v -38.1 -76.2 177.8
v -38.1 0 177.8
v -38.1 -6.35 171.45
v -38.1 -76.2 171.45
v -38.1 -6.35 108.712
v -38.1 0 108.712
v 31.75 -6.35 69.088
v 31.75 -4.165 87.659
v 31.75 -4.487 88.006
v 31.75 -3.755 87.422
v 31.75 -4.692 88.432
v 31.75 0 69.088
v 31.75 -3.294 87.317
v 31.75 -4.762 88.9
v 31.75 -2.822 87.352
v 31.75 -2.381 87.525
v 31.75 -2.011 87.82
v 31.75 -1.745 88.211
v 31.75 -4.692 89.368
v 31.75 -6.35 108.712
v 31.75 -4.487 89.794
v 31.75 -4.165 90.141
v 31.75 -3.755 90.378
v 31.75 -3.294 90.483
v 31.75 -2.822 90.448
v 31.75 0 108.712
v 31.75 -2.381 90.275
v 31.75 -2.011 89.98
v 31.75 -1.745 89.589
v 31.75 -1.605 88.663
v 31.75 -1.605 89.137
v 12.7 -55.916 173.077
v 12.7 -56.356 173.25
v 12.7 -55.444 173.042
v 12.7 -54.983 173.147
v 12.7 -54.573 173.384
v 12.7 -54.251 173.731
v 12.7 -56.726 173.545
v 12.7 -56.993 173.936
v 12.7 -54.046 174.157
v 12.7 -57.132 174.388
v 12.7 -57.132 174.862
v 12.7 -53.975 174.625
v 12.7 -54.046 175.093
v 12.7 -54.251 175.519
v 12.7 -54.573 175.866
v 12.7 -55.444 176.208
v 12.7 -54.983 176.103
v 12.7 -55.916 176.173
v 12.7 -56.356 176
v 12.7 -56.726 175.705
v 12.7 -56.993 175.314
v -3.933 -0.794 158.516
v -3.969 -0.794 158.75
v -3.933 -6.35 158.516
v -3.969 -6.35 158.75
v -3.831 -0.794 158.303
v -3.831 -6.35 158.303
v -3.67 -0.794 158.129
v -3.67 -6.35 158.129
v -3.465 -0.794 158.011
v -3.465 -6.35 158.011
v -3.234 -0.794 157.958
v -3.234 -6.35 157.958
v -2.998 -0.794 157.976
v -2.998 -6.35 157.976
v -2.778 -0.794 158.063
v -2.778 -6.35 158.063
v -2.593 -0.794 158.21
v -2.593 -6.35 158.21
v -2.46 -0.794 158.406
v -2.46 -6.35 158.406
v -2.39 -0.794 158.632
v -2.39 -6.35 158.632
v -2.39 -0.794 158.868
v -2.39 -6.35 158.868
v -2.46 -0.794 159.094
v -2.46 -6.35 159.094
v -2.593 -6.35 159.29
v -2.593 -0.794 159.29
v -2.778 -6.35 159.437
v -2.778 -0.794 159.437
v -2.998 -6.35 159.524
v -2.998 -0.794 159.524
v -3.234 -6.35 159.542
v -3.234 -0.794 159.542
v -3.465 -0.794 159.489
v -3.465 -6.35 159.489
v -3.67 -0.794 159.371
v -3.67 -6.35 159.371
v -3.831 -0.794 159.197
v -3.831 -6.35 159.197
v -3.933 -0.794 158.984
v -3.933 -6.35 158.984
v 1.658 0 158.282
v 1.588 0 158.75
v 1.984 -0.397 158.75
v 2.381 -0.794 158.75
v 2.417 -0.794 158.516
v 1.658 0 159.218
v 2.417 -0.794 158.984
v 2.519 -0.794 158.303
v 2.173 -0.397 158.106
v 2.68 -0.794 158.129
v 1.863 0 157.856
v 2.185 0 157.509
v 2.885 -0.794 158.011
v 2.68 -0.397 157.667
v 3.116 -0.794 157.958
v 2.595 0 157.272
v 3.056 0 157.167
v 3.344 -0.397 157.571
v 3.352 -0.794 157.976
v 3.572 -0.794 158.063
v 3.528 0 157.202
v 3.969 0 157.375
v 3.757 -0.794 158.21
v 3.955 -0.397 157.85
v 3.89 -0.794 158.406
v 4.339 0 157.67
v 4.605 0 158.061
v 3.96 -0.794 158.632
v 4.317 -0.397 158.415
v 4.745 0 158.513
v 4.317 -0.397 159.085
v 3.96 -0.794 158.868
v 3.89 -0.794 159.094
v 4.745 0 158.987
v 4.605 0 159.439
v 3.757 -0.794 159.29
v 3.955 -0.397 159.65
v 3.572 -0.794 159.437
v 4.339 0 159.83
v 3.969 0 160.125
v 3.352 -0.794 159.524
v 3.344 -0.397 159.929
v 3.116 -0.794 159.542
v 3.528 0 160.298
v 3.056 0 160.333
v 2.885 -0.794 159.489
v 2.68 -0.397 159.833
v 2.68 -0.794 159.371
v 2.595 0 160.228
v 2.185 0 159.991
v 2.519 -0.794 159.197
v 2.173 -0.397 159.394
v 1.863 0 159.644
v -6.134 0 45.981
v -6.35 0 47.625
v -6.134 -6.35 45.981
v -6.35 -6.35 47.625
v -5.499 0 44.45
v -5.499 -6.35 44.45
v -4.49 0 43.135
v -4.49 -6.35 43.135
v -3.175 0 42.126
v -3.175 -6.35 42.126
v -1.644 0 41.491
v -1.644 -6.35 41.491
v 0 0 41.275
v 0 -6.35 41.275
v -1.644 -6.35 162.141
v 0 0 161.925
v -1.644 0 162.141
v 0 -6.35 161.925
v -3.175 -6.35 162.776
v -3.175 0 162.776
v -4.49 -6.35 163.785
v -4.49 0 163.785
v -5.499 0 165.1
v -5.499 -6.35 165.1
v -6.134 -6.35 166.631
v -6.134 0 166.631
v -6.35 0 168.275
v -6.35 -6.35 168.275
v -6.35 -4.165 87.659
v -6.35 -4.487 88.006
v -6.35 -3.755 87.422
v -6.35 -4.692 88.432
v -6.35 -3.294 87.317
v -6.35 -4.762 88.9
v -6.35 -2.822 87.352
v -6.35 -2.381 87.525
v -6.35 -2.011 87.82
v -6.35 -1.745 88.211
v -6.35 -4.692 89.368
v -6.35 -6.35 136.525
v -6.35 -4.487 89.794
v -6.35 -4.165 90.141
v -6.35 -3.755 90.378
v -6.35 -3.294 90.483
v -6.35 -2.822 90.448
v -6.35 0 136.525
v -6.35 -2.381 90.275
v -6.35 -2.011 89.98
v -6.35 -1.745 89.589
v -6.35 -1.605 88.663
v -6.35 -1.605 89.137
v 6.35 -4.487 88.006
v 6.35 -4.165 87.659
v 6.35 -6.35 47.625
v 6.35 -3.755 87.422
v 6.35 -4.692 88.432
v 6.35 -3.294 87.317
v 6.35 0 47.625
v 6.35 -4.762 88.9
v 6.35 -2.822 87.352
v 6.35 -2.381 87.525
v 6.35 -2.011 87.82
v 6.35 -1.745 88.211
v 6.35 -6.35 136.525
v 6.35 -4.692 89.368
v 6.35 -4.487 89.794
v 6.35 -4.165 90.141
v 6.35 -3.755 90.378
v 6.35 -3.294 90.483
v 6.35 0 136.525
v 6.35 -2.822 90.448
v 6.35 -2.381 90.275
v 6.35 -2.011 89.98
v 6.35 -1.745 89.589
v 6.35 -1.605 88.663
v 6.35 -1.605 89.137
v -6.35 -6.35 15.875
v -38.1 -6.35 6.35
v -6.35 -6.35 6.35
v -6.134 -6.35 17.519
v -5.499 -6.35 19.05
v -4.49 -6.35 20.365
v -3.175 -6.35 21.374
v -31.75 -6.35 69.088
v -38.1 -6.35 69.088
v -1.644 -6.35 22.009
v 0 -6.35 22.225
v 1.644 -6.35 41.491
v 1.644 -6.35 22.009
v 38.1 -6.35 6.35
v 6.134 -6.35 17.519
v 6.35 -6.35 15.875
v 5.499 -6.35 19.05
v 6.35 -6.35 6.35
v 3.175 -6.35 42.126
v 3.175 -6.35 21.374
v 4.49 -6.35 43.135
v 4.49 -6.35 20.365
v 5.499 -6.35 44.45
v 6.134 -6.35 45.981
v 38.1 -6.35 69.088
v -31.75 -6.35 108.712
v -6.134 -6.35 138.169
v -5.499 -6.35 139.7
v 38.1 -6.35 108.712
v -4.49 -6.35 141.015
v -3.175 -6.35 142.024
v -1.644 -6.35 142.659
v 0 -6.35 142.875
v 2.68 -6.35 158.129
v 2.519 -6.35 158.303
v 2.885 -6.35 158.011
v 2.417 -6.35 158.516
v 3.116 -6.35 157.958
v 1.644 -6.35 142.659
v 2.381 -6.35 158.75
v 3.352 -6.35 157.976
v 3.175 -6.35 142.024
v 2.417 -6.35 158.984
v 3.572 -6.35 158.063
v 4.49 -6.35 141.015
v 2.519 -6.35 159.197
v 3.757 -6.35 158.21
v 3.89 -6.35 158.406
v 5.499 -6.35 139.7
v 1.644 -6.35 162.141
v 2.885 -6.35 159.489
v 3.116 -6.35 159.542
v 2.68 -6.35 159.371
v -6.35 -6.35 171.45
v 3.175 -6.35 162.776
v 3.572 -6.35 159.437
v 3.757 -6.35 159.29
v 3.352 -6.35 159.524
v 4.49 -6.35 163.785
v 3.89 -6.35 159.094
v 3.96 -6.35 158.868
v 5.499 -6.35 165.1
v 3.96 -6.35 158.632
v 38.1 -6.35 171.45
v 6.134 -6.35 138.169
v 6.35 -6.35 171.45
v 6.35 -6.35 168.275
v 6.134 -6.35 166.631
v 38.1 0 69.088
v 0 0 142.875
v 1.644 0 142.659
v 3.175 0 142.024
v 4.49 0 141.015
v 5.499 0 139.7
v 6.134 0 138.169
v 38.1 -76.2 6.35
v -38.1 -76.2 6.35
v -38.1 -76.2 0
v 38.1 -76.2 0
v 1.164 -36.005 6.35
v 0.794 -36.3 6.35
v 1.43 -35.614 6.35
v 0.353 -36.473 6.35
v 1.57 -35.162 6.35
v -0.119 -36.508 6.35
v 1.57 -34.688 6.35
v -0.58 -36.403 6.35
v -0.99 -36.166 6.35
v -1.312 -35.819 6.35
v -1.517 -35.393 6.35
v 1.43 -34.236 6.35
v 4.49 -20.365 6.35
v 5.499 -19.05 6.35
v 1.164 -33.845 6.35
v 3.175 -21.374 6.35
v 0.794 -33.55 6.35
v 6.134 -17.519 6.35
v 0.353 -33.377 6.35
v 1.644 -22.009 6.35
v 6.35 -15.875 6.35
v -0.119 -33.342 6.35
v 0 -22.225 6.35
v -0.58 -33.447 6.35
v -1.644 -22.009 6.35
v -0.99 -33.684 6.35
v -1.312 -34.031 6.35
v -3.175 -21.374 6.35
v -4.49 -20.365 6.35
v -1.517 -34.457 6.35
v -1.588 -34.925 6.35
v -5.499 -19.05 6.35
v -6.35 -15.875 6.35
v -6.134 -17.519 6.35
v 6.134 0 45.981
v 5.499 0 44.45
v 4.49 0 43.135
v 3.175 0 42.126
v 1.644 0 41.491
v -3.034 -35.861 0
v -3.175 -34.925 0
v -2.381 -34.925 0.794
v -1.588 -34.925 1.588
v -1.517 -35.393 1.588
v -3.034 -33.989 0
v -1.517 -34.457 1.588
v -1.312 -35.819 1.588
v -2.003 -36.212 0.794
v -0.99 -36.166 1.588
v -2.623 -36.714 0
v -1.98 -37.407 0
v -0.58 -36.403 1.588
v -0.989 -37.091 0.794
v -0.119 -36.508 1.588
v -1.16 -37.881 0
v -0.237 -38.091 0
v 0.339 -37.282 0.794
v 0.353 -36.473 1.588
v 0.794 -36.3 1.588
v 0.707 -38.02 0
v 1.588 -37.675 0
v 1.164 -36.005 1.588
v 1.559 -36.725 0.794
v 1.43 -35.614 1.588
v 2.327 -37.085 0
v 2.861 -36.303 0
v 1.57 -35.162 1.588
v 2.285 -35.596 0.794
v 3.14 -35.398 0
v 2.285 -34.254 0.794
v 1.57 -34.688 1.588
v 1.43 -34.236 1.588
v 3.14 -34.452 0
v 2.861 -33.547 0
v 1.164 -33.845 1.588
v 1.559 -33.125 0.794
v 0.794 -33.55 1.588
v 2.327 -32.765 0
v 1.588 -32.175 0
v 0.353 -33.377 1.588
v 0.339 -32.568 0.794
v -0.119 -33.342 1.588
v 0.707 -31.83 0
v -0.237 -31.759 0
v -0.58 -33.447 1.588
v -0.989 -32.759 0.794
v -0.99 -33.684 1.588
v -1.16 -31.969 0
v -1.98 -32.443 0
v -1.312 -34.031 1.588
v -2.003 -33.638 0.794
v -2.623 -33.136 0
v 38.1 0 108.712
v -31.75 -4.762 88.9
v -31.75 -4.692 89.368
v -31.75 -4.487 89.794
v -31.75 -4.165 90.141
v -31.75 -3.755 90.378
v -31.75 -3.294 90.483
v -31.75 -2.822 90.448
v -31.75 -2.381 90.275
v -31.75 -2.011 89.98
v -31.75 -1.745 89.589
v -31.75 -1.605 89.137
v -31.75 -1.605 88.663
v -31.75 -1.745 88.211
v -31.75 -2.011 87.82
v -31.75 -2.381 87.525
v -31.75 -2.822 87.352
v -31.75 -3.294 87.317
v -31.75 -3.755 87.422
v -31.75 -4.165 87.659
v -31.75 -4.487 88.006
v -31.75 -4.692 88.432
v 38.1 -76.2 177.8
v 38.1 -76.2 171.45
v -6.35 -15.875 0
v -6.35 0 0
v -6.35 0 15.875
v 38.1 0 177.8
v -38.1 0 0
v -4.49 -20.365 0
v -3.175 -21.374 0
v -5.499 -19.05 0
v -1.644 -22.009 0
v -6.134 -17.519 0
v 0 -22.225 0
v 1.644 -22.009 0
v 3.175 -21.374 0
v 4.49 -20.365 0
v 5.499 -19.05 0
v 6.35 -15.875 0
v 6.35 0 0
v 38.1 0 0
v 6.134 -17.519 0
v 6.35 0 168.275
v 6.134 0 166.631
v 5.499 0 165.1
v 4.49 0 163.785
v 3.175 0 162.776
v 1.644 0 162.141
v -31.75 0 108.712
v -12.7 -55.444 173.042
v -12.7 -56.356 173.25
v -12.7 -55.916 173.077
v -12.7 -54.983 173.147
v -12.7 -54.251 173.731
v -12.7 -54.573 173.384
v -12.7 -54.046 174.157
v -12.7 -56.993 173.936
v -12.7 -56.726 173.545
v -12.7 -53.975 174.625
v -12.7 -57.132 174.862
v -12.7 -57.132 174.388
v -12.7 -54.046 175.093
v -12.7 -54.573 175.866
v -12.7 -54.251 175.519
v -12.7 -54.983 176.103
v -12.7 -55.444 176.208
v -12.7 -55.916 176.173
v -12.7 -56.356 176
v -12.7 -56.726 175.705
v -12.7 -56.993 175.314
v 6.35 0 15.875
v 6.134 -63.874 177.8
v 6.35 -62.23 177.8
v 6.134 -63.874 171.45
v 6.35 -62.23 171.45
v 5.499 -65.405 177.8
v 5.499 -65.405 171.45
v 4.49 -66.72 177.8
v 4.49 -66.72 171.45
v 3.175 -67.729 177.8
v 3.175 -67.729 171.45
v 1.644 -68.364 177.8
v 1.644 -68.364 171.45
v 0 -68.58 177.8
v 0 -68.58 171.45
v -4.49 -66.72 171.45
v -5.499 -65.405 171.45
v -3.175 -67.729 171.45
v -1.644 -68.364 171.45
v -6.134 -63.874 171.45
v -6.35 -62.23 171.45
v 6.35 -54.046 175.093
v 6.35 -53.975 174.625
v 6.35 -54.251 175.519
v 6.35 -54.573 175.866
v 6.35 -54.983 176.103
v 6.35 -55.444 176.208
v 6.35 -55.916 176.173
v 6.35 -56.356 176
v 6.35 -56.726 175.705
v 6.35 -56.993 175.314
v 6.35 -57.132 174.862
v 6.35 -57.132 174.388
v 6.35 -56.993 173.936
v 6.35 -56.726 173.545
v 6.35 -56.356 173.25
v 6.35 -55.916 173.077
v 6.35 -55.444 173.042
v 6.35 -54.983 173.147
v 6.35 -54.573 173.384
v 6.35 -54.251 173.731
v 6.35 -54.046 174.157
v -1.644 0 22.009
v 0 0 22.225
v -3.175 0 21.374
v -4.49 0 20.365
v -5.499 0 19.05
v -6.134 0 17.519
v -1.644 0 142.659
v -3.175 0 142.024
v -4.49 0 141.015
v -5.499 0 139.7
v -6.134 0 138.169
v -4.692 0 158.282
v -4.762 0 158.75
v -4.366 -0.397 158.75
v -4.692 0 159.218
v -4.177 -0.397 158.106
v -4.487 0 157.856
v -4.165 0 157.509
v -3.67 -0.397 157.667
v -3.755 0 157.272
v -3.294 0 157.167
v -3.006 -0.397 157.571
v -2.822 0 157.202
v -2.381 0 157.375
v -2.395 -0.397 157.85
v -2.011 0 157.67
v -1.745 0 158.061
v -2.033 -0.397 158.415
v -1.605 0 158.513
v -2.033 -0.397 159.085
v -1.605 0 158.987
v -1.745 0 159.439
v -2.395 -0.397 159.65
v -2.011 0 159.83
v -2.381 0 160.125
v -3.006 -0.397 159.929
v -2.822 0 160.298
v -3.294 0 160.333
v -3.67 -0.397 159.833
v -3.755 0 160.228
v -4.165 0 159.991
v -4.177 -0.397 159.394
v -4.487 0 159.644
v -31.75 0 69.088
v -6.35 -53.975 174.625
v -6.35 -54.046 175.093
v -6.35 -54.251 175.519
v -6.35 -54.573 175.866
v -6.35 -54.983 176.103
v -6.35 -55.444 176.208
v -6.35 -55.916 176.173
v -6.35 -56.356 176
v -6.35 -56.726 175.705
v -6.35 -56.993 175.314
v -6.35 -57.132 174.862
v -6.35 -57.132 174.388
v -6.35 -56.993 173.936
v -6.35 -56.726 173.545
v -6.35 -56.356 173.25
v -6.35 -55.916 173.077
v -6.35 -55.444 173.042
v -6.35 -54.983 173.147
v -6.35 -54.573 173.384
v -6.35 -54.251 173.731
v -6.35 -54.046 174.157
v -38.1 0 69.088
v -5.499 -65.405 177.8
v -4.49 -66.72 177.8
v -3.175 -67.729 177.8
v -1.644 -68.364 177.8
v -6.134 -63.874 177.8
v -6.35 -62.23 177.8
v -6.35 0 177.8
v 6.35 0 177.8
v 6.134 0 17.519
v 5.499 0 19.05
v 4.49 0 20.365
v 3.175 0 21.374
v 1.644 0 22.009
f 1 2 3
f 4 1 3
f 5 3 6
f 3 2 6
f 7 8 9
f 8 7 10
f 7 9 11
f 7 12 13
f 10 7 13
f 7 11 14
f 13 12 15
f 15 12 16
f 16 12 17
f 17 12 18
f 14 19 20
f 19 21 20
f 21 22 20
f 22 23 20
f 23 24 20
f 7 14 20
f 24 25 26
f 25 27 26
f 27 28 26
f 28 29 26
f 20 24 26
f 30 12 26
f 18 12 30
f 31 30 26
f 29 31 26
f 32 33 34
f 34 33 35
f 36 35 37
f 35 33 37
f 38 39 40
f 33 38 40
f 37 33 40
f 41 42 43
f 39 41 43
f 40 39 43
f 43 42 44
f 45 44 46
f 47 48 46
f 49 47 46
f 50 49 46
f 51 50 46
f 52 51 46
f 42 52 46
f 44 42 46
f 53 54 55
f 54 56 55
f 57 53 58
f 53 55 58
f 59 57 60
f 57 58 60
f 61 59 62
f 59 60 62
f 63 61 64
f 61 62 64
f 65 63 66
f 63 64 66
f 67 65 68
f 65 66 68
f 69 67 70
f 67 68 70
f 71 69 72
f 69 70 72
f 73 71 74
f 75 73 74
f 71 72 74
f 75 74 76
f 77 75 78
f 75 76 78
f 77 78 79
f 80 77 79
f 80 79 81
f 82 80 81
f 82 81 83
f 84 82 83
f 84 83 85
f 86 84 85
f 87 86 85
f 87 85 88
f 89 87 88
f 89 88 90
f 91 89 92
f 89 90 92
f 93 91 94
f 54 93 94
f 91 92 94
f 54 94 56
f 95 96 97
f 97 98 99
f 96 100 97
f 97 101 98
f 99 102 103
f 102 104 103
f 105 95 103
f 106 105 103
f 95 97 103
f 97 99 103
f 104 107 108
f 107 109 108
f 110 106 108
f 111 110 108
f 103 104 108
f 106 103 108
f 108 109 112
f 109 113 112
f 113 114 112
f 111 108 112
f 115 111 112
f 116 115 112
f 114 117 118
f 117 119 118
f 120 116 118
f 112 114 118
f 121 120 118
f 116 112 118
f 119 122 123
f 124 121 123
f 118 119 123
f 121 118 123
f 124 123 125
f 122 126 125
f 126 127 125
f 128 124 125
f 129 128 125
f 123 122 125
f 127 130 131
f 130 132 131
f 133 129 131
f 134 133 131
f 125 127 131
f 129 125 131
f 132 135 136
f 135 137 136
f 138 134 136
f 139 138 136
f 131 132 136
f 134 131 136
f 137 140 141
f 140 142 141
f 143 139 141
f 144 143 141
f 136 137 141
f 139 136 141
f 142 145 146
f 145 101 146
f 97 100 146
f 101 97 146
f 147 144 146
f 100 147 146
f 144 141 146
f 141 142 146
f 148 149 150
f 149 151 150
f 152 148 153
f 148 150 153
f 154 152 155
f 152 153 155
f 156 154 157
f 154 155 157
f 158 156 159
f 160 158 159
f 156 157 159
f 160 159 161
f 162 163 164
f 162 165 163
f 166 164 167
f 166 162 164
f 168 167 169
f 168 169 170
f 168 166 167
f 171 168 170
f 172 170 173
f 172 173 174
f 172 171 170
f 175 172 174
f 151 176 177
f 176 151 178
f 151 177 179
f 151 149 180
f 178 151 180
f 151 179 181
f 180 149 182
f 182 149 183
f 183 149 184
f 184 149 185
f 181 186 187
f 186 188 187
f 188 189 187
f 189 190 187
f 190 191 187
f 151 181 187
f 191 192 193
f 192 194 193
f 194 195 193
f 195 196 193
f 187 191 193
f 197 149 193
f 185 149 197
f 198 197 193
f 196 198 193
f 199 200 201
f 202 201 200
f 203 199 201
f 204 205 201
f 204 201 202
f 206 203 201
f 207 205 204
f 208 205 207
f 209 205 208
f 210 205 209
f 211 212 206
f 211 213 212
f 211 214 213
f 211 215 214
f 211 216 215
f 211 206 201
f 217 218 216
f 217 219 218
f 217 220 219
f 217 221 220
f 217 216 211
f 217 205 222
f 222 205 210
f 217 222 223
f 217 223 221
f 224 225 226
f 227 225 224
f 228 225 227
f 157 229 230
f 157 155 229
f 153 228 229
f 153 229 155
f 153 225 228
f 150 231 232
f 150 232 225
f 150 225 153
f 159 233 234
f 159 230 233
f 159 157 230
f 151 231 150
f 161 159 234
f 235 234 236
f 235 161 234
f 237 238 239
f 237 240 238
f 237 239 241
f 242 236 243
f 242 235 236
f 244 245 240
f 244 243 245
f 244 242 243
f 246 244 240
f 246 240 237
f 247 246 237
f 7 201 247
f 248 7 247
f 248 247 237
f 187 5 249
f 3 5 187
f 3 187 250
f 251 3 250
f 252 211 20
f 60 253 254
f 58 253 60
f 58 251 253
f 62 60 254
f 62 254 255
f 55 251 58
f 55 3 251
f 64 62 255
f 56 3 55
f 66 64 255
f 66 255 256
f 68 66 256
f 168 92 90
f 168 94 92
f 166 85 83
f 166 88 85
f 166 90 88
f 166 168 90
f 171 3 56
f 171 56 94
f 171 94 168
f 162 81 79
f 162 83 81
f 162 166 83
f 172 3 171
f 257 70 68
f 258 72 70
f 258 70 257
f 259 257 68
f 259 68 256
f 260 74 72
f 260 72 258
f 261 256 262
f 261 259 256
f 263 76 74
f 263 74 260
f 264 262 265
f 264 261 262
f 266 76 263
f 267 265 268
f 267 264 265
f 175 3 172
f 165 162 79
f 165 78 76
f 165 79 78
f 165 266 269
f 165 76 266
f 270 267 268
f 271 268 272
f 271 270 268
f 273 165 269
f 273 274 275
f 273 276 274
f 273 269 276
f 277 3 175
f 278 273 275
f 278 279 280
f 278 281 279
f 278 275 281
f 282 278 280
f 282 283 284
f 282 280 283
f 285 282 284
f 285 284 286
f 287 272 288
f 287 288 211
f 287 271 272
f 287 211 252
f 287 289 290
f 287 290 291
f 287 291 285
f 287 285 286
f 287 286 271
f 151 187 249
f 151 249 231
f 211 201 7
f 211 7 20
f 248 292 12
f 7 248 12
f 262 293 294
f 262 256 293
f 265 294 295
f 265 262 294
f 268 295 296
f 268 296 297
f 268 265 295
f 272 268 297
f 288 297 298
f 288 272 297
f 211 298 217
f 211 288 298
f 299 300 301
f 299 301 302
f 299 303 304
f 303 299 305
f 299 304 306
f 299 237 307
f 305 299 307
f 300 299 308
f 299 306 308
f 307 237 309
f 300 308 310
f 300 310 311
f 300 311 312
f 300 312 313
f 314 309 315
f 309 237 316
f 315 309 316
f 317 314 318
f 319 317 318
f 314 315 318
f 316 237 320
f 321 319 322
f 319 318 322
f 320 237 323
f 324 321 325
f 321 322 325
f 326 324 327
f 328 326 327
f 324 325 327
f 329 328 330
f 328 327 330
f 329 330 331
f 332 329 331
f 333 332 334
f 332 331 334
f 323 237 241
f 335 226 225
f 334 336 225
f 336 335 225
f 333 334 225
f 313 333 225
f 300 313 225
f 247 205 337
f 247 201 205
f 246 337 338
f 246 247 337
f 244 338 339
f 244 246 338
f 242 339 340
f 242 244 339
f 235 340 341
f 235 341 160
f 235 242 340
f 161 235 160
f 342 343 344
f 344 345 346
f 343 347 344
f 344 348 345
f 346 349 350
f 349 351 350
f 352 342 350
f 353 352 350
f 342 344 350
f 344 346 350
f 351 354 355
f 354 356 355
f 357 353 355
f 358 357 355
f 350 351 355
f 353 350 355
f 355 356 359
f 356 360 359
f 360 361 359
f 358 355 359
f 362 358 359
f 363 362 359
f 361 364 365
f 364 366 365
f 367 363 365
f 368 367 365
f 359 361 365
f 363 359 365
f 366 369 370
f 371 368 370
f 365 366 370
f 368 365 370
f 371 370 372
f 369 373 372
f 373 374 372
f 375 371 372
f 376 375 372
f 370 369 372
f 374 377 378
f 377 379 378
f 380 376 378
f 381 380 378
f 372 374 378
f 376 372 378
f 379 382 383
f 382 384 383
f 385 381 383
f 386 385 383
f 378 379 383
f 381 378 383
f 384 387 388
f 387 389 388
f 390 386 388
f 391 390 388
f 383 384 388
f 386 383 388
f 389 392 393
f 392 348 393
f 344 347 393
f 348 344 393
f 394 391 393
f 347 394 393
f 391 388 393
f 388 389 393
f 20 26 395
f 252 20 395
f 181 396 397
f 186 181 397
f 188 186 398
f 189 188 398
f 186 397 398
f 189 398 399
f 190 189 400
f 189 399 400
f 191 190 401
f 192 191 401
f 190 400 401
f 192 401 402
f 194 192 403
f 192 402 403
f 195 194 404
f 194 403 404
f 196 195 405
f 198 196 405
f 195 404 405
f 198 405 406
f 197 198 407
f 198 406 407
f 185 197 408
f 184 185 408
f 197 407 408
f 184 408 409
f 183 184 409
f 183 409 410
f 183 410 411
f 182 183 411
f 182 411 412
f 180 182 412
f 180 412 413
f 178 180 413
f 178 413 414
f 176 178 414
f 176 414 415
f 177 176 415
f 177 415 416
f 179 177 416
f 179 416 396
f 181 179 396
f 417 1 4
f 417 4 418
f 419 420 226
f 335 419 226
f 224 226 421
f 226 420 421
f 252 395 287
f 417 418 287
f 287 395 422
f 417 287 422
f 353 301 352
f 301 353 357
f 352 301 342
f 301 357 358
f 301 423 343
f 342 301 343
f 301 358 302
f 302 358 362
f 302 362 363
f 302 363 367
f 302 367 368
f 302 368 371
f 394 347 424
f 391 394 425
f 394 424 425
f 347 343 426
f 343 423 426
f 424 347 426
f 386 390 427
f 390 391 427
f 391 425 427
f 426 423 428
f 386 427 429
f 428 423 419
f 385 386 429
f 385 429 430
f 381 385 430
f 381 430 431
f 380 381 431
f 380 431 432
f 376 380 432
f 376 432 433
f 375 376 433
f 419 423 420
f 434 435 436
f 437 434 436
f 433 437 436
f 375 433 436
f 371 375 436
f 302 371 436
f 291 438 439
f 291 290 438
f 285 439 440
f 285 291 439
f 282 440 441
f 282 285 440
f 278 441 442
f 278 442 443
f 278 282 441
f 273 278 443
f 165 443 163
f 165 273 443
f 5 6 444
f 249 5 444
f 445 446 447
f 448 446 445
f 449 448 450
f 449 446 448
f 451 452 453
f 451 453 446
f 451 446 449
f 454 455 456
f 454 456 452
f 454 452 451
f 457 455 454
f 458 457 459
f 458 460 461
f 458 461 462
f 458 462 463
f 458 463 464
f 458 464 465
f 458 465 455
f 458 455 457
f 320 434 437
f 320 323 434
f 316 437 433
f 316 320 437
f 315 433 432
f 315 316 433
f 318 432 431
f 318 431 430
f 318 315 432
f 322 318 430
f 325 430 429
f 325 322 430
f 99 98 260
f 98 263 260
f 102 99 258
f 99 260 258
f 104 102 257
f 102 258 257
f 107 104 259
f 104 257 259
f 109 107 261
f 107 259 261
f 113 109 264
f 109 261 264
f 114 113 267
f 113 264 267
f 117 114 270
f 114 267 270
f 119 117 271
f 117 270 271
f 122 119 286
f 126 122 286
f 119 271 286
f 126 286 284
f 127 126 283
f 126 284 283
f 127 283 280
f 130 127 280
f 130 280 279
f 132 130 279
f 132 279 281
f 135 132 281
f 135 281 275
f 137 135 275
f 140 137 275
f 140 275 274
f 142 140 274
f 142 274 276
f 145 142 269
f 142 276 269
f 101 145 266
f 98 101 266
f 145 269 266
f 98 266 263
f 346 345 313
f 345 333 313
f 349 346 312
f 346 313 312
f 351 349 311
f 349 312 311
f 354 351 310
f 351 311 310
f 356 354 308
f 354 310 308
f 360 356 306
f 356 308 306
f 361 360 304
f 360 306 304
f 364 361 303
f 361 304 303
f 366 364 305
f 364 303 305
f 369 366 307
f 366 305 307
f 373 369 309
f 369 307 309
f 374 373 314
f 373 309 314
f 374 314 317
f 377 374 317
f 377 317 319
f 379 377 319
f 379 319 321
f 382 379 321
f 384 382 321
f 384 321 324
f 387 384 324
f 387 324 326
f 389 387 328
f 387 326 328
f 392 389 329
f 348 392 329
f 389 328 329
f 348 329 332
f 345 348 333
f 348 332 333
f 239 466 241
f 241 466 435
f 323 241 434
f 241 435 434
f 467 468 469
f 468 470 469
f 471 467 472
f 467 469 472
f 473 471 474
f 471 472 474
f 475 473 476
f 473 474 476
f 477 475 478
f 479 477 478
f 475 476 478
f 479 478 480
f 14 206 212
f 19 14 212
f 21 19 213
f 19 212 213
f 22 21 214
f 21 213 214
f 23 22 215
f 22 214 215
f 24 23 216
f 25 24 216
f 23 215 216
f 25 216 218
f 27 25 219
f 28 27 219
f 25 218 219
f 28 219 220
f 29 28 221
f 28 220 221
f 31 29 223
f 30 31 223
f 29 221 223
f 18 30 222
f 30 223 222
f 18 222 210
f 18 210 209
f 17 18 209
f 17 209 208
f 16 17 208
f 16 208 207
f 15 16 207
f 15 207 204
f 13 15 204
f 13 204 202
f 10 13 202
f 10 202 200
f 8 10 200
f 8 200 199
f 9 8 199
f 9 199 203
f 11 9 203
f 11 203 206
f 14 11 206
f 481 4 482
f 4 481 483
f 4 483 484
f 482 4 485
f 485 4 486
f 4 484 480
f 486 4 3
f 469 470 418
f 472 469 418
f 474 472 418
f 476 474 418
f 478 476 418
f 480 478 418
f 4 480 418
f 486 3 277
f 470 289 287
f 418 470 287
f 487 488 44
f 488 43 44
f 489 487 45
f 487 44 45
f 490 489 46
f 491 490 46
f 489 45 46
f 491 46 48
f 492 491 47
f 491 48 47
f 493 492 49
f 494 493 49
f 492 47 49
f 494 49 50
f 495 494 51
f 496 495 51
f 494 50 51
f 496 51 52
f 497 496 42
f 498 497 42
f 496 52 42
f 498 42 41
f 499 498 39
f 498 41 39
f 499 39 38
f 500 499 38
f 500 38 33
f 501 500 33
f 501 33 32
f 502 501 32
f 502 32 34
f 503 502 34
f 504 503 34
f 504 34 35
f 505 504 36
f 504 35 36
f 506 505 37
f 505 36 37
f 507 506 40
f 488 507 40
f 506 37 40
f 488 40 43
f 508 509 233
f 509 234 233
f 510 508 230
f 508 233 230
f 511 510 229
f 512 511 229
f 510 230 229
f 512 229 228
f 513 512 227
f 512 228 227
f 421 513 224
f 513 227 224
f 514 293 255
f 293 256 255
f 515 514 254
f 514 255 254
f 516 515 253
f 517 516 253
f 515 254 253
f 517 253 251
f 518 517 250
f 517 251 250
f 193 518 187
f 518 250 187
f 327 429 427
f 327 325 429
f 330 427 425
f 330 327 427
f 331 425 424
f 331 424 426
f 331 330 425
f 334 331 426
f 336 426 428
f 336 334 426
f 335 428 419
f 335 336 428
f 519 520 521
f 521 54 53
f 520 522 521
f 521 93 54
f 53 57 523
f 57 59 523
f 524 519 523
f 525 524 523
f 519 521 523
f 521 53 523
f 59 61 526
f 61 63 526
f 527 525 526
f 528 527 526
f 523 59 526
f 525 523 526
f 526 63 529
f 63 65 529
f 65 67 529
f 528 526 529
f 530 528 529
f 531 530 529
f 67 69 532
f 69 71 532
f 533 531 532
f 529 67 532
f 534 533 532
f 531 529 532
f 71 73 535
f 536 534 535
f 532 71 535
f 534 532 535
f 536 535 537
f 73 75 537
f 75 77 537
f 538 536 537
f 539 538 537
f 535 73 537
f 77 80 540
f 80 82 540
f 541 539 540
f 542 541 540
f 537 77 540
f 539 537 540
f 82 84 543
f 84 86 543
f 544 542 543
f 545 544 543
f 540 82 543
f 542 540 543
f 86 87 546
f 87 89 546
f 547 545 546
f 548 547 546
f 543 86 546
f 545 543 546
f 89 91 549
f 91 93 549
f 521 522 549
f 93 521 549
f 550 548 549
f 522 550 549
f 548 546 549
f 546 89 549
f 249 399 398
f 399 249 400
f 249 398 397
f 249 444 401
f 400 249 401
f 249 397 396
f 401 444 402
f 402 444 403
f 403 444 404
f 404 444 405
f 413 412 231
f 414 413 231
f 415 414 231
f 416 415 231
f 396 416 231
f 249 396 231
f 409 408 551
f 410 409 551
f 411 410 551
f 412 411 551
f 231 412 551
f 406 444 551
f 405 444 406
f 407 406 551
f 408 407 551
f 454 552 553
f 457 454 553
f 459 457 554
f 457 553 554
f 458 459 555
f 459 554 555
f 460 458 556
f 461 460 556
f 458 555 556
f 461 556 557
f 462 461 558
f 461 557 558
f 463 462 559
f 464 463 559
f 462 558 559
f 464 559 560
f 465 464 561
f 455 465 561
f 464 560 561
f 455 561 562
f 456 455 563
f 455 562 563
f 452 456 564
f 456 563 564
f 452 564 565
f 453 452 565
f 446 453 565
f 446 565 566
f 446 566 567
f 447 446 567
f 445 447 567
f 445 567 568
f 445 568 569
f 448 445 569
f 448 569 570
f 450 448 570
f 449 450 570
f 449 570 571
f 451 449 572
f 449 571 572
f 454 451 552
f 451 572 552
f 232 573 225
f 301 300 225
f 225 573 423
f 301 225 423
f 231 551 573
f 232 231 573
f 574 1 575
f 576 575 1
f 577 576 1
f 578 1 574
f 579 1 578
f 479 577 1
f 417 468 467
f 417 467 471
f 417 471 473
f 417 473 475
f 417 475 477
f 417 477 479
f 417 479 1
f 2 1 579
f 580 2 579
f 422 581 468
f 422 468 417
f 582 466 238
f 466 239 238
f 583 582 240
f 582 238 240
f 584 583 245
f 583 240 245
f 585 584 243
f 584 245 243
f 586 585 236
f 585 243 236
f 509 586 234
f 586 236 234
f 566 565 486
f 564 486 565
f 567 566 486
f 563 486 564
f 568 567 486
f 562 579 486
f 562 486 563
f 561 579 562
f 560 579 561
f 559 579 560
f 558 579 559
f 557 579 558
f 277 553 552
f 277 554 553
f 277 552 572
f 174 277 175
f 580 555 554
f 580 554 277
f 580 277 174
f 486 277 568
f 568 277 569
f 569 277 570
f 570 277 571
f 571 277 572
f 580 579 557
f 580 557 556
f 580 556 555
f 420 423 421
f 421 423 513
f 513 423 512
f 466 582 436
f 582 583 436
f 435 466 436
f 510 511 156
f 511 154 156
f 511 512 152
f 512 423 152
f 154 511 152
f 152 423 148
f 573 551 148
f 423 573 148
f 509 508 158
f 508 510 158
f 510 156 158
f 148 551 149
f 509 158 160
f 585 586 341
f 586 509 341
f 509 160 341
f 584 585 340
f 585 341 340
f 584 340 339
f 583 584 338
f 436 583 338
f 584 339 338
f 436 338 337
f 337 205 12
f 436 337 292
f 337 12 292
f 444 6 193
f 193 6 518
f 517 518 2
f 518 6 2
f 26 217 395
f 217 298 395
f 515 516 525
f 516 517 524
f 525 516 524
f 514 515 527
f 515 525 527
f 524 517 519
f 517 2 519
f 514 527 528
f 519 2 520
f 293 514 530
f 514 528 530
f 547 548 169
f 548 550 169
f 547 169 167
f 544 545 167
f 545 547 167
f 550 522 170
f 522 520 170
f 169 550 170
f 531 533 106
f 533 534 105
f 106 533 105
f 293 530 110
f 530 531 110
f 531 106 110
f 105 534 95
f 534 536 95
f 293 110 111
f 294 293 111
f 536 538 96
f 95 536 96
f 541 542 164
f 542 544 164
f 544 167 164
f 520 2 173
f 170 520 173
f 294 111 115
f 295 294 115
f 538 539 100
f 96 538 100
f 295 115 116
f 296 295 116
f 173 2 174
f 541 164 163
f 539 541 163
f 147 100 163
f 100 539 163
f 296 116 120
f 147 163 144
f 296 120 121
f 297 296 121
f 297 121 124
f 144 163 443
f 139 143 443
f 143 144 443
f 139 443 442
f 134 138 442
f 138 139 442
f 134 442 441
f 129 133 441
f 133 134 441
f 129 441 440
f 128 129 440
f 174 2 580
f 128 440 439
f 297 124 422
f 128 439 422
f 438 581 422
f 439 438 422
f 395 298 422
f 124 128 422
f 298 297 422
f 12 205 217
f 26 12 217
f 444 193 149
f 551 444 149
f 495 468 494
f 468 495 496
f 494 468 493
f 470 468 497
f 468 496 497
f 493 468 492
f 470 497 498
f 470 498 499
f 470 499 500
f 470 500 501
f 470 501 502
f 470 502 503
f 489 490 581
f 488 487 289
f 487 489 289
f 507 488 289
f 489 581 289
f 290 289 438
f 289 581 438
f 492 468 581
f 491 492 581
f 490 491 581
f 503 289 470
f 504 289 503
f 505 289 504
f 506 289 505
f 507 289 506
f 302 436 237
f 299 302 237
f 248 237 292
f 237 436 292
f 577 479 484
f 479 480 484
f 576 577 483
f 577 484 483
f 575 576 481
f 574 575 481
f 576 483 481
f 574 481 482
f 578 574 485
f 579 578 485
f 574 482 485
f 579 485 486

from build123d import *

# Parameters (mm, degrees)
F0_W            = 31.75
F0_H            = 6.35
F0_W_2          = 12.7
F0_H_2          = 101.6
F1_DEPTH        = 6.35
F2_DEPTH        = 76.2
F3_W            = 12.7
F3_H            = 68.58
F4_DEPTH        = 6.35
F5_W            = 12.7
F5_H            = 22.225
F6_DEPTH        = 6.35
F7_D            = 1.5875
F7_CSINK_D      = 3.175
F7_CSINK_ANGLE  = 90
F8_R            = 6.34999
F10_D           = 3.175
F12_D           = 3.175
F12_CSINK_D     = 6.35
F12_CSINK_ANGLE = 90
F13_R           = 1.5875
F14_DEPTH       = 12.7


# Not quite as in the source:
# - a fillet or chamfer is up to 0.001 mm smaller than in the source, because OpenCascade refuses the exact size


with BuildPart() as f1:
    # F0 (on Front) → F1 (new body)
    with BuildSketch(Plane.XZ):
        with Locations((-22.225, 174.625)):
            Rectangle(F0_W, F0_H)
        with Locations((22.225, 174.625)):
            Rectangle(F0_W, F0_H)
        with Locations((-22.225, 3.175)):
            Rectangle(F0_W, F0_H)
        with Locations((22.225, 3.175)):
            Rectangle(F0_W, F0_H)
        Polygon((-6.35, 171.45), (-38.1, 171.45), (-38.1, 108.712), (-31.75, 108.712), (-31.75, 69.088), (-38.1, 69.088), (-38.1, 6.35), (-6.35, 6.35), (-6.35, 22.225), (6.35, 22.225), (6.35, 6.35), (38.1, 6.35), (38.1, 69.088), (31.75, 69.088), (31.75, 108.712), (38.1, 108.712), (38.1, 171.45), (6.35, 171.45), (6.35, 161.925), (-6.35, 161.925), align=None)
        with Locations((0, 92.075)):
            Rectangle(F0_W_2, F0_H_2, mode=Mode.SUBTRACT)
    extrude(amount=F1_DEPTH)

    # F0 (on Front) → F2 (join)
    with BuildSketch(Plane.XZ):
        with Locations((-22.225, 174.625)):
            Rectangle(F0_W, F0_H)
        with Locations((22.225, 174.625)):
            Rectangle(F0_W, F0_H)
        with Locations((-22.225, 3.175)):
            Rectangle(F0_W, F0_H)
        with Locations((22.225, 3.175)):
            Rectangle(F0_W, F0_H)
        with Locations((0, 3.175)):
            Rectangle(F0_W_2, F0_H)
        with Locations((0, 174.625)):
            Rectangle(F0_W_2, F0_H)
    extrude(amount=F2_DEPTH)

    # F3 (on face) → F4 (cut, through all)
    with BuildSketch(Plane.XY.offset(177.8)):
        with Locations((0, -34.29)):
            Rectangle(F3_W, F3_H)
    extrude(amount=-F4_DEPTH, mode=Mode.SUBTRACT)

    # F5 (on face) → F6 (cut, through all)
    with BuildSketch(Plane(origin=(0, 0, 0), x_dir=(1, 0, 0), z_dir=(0, 0, -1))):
        with Locations((0, 11.1125)):
            Rectangle(F5_W, F5_H)
    extrude(amount=-F6_DEPTH, mode=Mode.SUBTRACT)

    # F7 (through all)
    with Locations(Plane(origin=(0, 0, 0), x_dir=(1, 0, 0), z_dir=(0, 1, 0))):
        with Locations((-3.175, -158.75), (3.175, -158.75)):
            CounterSinkHole(F7_D / 2, F7_CSINK_D / 2, counter_sink_angle=F7_CSINK_ANGLE)

    # F8 (radius 6.35 in the source; OpenCascade refuses exactly that, so slightly less here)
    f8_edges = [f1.edges().sort_by_distance(p)[0] for p in [
        (-6.35, -3.175, 22.225),
        (6.35, -3.175, 22.225),
        (-6.35, -3.175, 161.925),
        (6.35, -3.175, 161.925),
        (-6.35, -68.58, 174.625),
        (6.35, -68.58, 174.625),
        (6.35, -22.225, 3.175),
        (-6.35, -22.225, 3.175),
        (-6.35, -3.175, 41.275),
        (6.35, -3.175, 41.275),
        (-6.35, -3.175, 142.875),
        (6.35, -3.175, 142.875),
    ]]
    fillet(f8_edges, radius=F8_R)

    # F10 (through all)
    with Locations(Plane.YZ.offset(38.1)):
        with Locations((-3.175, 88.9)):
            Hole(F10_D / 2)

    # F12 (through all)
    with Locations(Plane(origin=(0, 0, 0), x_dir=(1, 0, 0), z_dir=(0, 0, -1))):
        with Locations((0, 34.925)):
            CounterSinkHole(F12_D / 2, F12_CSINK_D / 2, counter_sink_angle=F12_CSINK_ANGLE)

    # F13 (on Right) → F14 (cut, symmetric)
    with BuildSketch(Plane.YZ):
        with Locations((-55.5625, 174.625)):
            Circle(F13_R)
    extrude(amount=F14_DEPTH, both=True, mode=Mode.SUBTRACT)


solid = f1.part
